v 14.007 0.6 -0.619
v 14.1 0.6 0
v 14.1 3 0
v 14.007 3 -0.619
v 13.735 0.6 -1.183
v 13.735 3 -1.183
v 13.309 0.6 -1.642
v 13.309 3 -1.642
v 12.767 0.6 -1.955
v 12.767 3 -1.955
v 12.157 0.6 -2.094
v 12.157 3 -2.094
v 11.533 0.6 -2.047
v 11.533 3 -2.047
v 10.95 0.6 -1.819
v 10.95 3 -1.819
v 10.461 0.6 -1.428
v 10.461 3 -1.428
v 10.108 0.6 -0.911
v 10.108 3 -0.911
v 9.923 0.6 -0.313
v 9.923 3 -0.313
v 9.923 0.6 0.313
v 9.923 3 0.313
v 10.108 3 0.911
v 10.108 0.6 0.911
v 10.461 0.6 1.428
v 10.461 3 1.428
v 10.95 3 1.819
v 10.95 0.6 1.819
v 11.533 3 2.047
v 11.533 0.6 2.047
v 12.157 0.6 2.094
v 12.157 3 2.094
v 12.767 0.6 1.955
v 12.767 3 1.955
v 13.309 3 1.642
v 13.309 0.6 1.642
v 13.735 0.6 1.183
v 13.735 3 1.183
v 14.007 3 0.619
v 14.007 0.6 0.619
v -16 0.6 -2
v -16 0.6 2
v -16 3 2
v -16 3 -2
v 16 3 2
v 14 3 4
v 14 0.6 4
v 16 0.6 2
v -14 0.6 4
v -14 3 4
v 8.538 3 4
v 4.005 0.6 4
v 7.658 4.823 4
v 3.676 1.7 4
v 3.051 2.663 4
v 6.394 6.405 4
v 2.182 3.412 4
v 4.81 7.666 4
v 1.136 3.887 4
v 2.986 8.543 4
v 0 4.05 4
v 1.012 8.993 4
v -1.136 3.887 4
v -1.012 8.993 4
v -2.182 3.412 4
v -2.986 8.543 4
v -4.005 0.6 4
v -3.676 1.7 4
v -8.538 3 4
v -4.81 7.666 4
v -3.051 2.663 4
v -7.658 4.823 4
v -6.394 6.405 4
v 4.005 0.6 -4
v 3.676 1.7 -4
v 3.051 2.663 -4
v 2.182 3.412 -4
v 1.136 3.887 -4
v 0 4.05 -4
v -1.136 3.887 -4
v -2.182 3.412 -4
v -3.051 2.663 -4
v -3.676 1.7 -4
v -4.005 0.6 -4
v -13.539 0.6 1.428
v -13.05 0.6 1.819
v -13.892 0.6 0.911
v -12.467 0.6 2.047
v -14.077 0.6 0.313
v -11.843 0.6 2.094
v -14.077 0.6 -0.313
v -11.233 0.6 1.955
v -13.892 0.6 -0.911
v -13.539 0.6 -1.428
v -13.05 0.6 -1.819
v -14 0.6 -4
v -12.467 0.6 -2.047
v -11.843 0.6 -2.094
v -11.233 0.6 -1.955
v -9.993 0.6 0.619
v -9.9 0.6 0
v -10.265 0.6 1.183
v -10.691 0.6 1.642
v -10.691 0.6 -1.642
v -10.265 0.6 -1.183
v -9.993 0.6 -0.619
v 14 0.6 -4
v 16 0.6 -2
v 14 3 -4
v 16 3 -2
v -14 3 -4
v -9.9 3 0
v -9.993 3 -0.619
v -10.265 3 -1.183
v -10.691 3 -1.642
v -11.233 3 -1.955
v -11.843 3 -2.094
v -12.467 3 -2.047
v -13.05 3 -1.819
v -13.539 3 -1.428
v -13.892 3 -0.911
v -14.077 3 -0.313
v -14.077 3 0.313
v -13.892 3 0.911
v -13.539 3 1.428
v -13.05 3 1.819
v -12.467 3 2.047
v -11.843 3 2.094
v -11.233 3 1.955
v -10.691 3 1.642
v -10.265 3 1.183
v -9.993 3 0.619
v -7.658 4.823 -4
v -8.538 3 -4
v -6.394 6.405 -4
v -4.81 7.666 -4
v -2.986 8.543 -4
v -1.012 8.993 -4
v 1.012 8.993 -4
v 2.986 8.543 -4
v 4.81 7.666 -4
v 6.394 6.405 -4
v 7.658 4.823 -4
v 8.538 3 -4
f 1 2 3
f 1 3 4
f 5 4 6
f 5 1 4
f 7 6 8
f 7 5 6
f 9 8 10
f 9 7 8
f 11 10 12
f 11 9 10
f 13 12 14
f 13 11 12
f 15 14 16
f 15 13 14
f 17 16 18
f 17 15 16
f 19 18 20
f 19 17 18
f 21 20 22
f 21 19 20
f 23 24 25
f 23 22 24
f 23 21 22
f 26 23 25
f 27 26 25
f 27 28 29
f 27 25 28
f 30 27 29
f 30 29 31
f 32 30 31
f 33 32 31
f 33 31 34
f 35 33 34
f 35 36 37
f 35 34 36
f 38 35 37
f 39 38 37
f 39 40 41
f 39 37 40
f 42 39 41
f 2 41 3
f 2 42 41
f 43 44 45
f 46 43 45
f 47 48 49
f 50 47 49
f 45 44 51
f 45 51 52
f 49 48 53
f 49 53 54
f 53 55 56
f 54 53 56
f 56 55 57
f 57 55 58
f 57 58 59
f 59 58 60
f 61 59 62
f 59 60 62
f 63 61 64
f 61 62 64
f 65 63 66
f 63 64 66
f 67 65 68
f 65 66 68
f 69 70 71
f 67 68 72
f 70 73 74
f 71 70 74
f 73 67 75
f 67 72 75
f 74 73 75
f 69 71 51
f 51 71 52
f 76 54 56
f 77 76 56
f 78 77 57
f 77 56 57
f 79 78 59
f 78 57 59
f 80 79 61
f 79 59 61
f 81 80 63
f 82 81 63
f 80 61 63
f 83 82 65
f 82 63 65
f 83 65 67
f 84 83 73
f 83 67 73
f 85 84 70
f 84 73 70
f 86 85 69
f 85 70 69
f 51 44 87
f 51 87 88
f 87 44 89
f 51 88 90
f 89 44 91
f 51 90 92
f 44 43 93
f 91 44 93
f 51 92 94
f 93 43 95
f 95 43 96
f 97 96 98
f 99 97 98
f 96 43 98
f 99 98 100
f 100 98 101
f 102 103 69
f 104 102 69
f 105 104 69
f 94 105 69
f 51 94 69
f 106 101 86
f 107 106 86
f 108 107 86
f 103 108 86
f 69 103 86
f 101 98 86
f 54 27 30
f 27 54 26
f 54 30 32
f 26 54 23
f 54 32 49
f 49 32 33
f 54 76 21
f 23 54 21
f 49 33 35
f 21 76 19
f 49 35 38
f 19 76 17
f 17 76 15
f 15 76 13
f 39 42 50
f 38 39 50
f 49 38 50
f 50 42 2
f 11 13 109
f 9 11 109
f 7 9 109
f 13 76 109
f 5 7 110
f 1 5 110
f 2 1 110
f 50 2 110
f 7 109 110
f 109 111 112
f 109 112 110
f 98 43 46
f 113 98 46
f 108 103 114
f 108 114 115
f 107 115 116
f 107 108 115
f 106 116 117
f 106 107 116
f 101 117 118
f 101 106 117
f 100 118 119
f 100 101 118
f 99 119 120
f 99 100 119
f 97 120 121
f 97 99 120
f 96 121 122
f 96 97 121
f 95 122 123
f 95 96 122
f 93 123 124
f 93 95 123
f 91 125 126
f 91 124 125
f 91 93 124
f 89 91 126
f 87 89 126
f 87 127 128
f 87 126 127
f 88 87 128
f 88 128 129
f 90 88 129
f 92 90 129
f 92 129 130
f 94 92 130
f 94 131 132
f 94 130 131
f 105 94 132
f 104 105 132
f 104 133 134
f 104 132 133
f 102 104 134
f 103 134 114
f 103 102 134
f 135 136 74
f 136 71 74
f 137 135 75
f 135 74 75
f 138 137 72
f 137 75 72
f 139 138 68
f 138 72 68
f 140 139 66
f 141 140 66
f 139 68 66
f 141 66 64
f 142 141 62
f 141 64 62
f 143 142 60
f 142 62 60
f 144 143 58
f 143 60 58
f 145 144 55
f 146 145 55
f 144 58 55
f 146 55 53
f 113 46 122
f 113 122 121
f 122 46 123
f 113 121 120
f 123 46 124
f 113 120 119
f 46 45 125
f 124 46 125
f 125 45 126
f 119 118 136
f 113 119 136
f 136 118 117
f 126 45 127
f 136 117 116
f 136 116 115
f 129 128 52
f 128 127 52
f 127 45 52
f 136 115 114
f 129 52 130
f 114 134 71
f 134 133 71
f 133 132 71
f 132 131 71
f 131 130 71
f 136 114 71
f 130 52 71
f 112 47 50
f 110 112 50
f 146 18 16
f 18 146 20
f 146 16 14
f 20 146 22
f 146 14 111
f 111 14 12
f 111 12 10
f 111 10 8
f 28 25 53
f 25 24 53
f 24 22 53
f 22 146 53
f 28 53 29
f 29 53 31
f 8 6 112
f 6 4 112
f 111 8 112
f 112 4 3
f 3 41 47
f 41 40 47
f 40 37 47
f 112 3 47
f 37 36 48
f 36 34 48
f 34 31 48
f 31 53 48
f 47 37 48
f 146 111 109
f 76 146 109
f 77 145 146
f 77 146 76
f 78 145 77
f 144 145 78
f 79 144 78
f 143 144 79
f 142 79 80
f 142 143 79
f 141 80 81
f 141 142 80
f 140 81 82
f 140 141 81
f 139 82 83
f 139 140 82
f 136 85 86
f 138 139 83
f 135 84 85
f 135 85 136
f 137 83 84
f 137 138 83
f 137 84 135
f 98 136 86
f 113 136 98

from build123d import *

# Parameters (mm, degrees)
BOSS_EXTRUDE1_DEPTH = 4
SKETCH2_R           = 2.1
CUT_EXTRUDE1_DEPTH  = 19.812296511
SKETCH3_W           = 40
SKETCH3_H           = 10
CUT_EXTRUDE2_DEPTH  = 0.6
CHAMFER1_SIZE       = 2


with BuildPart() as part:
    # Sketch1 → Boss-Extrude1 (new, symmetric)
    with BuildSketch(Plane.XY):
        with BuildLine():
            Line((-4.05, 0), (-16, 0))
            Line((-16, 0), (-16, 3))
            Line((-16, 3), (-8.538296083, 3))
            ThreePointArc((-8.538296083, 3), (0, 9.05), (8.538296083, 3))
            Line((8.538296083, 3), (16, 3))
            Line((16, 3), (16, 0))
            Line((16, 0), (4.05, 0))
            ThreePointArc((4.05, 0), (0, 4.05), (-4.05, 0))
        make_face()
    extrude(amount=BOSS_EXTRUDE1_DEPTH, both=True)

    # Sketch2 → Cut-Extrude1 (cut, through all)
    with BuildSketch(Plane(origin=(0, 0, 0), x_dir=(1, 0, 0), z_dir=(0, 1, 0))):
        with Locations((-12, 0)):
            Circle(SKETCH2_R)
        with Locations((12, 0)):
            Circle(SKETCH2_R)
    extrude(amount=CUT_EXTRUDE1_DEPTH, mode=Mode.SUBTRACT)

    # Sketch3 → Cut-Extrude2 (cut)
    with BuildSketch(Plane(origin=(0, 0, 0), x_dir=(1, 0, 0), z_dir=(0, 1, 0))):
        Rectangle(SKETCH3_W, SKETCH3_H)
    extrude(amount=CUT_EXTRUDE2_DEPTH, mode=Mode.SUBTRACT)

    # Chamfer1
    chamfer1_edges = [part.edges().sort_by_distance(p)[0] for p in [
        (-16, 1.8, 4),
        (16, 1.8, -4),
        (16, 1.8, 4),
        (-16, 1.8, -4),
    ]]
    chamfer(chamfer1_edges, length=CHAMFER1_SIZE)


solid = part.part
